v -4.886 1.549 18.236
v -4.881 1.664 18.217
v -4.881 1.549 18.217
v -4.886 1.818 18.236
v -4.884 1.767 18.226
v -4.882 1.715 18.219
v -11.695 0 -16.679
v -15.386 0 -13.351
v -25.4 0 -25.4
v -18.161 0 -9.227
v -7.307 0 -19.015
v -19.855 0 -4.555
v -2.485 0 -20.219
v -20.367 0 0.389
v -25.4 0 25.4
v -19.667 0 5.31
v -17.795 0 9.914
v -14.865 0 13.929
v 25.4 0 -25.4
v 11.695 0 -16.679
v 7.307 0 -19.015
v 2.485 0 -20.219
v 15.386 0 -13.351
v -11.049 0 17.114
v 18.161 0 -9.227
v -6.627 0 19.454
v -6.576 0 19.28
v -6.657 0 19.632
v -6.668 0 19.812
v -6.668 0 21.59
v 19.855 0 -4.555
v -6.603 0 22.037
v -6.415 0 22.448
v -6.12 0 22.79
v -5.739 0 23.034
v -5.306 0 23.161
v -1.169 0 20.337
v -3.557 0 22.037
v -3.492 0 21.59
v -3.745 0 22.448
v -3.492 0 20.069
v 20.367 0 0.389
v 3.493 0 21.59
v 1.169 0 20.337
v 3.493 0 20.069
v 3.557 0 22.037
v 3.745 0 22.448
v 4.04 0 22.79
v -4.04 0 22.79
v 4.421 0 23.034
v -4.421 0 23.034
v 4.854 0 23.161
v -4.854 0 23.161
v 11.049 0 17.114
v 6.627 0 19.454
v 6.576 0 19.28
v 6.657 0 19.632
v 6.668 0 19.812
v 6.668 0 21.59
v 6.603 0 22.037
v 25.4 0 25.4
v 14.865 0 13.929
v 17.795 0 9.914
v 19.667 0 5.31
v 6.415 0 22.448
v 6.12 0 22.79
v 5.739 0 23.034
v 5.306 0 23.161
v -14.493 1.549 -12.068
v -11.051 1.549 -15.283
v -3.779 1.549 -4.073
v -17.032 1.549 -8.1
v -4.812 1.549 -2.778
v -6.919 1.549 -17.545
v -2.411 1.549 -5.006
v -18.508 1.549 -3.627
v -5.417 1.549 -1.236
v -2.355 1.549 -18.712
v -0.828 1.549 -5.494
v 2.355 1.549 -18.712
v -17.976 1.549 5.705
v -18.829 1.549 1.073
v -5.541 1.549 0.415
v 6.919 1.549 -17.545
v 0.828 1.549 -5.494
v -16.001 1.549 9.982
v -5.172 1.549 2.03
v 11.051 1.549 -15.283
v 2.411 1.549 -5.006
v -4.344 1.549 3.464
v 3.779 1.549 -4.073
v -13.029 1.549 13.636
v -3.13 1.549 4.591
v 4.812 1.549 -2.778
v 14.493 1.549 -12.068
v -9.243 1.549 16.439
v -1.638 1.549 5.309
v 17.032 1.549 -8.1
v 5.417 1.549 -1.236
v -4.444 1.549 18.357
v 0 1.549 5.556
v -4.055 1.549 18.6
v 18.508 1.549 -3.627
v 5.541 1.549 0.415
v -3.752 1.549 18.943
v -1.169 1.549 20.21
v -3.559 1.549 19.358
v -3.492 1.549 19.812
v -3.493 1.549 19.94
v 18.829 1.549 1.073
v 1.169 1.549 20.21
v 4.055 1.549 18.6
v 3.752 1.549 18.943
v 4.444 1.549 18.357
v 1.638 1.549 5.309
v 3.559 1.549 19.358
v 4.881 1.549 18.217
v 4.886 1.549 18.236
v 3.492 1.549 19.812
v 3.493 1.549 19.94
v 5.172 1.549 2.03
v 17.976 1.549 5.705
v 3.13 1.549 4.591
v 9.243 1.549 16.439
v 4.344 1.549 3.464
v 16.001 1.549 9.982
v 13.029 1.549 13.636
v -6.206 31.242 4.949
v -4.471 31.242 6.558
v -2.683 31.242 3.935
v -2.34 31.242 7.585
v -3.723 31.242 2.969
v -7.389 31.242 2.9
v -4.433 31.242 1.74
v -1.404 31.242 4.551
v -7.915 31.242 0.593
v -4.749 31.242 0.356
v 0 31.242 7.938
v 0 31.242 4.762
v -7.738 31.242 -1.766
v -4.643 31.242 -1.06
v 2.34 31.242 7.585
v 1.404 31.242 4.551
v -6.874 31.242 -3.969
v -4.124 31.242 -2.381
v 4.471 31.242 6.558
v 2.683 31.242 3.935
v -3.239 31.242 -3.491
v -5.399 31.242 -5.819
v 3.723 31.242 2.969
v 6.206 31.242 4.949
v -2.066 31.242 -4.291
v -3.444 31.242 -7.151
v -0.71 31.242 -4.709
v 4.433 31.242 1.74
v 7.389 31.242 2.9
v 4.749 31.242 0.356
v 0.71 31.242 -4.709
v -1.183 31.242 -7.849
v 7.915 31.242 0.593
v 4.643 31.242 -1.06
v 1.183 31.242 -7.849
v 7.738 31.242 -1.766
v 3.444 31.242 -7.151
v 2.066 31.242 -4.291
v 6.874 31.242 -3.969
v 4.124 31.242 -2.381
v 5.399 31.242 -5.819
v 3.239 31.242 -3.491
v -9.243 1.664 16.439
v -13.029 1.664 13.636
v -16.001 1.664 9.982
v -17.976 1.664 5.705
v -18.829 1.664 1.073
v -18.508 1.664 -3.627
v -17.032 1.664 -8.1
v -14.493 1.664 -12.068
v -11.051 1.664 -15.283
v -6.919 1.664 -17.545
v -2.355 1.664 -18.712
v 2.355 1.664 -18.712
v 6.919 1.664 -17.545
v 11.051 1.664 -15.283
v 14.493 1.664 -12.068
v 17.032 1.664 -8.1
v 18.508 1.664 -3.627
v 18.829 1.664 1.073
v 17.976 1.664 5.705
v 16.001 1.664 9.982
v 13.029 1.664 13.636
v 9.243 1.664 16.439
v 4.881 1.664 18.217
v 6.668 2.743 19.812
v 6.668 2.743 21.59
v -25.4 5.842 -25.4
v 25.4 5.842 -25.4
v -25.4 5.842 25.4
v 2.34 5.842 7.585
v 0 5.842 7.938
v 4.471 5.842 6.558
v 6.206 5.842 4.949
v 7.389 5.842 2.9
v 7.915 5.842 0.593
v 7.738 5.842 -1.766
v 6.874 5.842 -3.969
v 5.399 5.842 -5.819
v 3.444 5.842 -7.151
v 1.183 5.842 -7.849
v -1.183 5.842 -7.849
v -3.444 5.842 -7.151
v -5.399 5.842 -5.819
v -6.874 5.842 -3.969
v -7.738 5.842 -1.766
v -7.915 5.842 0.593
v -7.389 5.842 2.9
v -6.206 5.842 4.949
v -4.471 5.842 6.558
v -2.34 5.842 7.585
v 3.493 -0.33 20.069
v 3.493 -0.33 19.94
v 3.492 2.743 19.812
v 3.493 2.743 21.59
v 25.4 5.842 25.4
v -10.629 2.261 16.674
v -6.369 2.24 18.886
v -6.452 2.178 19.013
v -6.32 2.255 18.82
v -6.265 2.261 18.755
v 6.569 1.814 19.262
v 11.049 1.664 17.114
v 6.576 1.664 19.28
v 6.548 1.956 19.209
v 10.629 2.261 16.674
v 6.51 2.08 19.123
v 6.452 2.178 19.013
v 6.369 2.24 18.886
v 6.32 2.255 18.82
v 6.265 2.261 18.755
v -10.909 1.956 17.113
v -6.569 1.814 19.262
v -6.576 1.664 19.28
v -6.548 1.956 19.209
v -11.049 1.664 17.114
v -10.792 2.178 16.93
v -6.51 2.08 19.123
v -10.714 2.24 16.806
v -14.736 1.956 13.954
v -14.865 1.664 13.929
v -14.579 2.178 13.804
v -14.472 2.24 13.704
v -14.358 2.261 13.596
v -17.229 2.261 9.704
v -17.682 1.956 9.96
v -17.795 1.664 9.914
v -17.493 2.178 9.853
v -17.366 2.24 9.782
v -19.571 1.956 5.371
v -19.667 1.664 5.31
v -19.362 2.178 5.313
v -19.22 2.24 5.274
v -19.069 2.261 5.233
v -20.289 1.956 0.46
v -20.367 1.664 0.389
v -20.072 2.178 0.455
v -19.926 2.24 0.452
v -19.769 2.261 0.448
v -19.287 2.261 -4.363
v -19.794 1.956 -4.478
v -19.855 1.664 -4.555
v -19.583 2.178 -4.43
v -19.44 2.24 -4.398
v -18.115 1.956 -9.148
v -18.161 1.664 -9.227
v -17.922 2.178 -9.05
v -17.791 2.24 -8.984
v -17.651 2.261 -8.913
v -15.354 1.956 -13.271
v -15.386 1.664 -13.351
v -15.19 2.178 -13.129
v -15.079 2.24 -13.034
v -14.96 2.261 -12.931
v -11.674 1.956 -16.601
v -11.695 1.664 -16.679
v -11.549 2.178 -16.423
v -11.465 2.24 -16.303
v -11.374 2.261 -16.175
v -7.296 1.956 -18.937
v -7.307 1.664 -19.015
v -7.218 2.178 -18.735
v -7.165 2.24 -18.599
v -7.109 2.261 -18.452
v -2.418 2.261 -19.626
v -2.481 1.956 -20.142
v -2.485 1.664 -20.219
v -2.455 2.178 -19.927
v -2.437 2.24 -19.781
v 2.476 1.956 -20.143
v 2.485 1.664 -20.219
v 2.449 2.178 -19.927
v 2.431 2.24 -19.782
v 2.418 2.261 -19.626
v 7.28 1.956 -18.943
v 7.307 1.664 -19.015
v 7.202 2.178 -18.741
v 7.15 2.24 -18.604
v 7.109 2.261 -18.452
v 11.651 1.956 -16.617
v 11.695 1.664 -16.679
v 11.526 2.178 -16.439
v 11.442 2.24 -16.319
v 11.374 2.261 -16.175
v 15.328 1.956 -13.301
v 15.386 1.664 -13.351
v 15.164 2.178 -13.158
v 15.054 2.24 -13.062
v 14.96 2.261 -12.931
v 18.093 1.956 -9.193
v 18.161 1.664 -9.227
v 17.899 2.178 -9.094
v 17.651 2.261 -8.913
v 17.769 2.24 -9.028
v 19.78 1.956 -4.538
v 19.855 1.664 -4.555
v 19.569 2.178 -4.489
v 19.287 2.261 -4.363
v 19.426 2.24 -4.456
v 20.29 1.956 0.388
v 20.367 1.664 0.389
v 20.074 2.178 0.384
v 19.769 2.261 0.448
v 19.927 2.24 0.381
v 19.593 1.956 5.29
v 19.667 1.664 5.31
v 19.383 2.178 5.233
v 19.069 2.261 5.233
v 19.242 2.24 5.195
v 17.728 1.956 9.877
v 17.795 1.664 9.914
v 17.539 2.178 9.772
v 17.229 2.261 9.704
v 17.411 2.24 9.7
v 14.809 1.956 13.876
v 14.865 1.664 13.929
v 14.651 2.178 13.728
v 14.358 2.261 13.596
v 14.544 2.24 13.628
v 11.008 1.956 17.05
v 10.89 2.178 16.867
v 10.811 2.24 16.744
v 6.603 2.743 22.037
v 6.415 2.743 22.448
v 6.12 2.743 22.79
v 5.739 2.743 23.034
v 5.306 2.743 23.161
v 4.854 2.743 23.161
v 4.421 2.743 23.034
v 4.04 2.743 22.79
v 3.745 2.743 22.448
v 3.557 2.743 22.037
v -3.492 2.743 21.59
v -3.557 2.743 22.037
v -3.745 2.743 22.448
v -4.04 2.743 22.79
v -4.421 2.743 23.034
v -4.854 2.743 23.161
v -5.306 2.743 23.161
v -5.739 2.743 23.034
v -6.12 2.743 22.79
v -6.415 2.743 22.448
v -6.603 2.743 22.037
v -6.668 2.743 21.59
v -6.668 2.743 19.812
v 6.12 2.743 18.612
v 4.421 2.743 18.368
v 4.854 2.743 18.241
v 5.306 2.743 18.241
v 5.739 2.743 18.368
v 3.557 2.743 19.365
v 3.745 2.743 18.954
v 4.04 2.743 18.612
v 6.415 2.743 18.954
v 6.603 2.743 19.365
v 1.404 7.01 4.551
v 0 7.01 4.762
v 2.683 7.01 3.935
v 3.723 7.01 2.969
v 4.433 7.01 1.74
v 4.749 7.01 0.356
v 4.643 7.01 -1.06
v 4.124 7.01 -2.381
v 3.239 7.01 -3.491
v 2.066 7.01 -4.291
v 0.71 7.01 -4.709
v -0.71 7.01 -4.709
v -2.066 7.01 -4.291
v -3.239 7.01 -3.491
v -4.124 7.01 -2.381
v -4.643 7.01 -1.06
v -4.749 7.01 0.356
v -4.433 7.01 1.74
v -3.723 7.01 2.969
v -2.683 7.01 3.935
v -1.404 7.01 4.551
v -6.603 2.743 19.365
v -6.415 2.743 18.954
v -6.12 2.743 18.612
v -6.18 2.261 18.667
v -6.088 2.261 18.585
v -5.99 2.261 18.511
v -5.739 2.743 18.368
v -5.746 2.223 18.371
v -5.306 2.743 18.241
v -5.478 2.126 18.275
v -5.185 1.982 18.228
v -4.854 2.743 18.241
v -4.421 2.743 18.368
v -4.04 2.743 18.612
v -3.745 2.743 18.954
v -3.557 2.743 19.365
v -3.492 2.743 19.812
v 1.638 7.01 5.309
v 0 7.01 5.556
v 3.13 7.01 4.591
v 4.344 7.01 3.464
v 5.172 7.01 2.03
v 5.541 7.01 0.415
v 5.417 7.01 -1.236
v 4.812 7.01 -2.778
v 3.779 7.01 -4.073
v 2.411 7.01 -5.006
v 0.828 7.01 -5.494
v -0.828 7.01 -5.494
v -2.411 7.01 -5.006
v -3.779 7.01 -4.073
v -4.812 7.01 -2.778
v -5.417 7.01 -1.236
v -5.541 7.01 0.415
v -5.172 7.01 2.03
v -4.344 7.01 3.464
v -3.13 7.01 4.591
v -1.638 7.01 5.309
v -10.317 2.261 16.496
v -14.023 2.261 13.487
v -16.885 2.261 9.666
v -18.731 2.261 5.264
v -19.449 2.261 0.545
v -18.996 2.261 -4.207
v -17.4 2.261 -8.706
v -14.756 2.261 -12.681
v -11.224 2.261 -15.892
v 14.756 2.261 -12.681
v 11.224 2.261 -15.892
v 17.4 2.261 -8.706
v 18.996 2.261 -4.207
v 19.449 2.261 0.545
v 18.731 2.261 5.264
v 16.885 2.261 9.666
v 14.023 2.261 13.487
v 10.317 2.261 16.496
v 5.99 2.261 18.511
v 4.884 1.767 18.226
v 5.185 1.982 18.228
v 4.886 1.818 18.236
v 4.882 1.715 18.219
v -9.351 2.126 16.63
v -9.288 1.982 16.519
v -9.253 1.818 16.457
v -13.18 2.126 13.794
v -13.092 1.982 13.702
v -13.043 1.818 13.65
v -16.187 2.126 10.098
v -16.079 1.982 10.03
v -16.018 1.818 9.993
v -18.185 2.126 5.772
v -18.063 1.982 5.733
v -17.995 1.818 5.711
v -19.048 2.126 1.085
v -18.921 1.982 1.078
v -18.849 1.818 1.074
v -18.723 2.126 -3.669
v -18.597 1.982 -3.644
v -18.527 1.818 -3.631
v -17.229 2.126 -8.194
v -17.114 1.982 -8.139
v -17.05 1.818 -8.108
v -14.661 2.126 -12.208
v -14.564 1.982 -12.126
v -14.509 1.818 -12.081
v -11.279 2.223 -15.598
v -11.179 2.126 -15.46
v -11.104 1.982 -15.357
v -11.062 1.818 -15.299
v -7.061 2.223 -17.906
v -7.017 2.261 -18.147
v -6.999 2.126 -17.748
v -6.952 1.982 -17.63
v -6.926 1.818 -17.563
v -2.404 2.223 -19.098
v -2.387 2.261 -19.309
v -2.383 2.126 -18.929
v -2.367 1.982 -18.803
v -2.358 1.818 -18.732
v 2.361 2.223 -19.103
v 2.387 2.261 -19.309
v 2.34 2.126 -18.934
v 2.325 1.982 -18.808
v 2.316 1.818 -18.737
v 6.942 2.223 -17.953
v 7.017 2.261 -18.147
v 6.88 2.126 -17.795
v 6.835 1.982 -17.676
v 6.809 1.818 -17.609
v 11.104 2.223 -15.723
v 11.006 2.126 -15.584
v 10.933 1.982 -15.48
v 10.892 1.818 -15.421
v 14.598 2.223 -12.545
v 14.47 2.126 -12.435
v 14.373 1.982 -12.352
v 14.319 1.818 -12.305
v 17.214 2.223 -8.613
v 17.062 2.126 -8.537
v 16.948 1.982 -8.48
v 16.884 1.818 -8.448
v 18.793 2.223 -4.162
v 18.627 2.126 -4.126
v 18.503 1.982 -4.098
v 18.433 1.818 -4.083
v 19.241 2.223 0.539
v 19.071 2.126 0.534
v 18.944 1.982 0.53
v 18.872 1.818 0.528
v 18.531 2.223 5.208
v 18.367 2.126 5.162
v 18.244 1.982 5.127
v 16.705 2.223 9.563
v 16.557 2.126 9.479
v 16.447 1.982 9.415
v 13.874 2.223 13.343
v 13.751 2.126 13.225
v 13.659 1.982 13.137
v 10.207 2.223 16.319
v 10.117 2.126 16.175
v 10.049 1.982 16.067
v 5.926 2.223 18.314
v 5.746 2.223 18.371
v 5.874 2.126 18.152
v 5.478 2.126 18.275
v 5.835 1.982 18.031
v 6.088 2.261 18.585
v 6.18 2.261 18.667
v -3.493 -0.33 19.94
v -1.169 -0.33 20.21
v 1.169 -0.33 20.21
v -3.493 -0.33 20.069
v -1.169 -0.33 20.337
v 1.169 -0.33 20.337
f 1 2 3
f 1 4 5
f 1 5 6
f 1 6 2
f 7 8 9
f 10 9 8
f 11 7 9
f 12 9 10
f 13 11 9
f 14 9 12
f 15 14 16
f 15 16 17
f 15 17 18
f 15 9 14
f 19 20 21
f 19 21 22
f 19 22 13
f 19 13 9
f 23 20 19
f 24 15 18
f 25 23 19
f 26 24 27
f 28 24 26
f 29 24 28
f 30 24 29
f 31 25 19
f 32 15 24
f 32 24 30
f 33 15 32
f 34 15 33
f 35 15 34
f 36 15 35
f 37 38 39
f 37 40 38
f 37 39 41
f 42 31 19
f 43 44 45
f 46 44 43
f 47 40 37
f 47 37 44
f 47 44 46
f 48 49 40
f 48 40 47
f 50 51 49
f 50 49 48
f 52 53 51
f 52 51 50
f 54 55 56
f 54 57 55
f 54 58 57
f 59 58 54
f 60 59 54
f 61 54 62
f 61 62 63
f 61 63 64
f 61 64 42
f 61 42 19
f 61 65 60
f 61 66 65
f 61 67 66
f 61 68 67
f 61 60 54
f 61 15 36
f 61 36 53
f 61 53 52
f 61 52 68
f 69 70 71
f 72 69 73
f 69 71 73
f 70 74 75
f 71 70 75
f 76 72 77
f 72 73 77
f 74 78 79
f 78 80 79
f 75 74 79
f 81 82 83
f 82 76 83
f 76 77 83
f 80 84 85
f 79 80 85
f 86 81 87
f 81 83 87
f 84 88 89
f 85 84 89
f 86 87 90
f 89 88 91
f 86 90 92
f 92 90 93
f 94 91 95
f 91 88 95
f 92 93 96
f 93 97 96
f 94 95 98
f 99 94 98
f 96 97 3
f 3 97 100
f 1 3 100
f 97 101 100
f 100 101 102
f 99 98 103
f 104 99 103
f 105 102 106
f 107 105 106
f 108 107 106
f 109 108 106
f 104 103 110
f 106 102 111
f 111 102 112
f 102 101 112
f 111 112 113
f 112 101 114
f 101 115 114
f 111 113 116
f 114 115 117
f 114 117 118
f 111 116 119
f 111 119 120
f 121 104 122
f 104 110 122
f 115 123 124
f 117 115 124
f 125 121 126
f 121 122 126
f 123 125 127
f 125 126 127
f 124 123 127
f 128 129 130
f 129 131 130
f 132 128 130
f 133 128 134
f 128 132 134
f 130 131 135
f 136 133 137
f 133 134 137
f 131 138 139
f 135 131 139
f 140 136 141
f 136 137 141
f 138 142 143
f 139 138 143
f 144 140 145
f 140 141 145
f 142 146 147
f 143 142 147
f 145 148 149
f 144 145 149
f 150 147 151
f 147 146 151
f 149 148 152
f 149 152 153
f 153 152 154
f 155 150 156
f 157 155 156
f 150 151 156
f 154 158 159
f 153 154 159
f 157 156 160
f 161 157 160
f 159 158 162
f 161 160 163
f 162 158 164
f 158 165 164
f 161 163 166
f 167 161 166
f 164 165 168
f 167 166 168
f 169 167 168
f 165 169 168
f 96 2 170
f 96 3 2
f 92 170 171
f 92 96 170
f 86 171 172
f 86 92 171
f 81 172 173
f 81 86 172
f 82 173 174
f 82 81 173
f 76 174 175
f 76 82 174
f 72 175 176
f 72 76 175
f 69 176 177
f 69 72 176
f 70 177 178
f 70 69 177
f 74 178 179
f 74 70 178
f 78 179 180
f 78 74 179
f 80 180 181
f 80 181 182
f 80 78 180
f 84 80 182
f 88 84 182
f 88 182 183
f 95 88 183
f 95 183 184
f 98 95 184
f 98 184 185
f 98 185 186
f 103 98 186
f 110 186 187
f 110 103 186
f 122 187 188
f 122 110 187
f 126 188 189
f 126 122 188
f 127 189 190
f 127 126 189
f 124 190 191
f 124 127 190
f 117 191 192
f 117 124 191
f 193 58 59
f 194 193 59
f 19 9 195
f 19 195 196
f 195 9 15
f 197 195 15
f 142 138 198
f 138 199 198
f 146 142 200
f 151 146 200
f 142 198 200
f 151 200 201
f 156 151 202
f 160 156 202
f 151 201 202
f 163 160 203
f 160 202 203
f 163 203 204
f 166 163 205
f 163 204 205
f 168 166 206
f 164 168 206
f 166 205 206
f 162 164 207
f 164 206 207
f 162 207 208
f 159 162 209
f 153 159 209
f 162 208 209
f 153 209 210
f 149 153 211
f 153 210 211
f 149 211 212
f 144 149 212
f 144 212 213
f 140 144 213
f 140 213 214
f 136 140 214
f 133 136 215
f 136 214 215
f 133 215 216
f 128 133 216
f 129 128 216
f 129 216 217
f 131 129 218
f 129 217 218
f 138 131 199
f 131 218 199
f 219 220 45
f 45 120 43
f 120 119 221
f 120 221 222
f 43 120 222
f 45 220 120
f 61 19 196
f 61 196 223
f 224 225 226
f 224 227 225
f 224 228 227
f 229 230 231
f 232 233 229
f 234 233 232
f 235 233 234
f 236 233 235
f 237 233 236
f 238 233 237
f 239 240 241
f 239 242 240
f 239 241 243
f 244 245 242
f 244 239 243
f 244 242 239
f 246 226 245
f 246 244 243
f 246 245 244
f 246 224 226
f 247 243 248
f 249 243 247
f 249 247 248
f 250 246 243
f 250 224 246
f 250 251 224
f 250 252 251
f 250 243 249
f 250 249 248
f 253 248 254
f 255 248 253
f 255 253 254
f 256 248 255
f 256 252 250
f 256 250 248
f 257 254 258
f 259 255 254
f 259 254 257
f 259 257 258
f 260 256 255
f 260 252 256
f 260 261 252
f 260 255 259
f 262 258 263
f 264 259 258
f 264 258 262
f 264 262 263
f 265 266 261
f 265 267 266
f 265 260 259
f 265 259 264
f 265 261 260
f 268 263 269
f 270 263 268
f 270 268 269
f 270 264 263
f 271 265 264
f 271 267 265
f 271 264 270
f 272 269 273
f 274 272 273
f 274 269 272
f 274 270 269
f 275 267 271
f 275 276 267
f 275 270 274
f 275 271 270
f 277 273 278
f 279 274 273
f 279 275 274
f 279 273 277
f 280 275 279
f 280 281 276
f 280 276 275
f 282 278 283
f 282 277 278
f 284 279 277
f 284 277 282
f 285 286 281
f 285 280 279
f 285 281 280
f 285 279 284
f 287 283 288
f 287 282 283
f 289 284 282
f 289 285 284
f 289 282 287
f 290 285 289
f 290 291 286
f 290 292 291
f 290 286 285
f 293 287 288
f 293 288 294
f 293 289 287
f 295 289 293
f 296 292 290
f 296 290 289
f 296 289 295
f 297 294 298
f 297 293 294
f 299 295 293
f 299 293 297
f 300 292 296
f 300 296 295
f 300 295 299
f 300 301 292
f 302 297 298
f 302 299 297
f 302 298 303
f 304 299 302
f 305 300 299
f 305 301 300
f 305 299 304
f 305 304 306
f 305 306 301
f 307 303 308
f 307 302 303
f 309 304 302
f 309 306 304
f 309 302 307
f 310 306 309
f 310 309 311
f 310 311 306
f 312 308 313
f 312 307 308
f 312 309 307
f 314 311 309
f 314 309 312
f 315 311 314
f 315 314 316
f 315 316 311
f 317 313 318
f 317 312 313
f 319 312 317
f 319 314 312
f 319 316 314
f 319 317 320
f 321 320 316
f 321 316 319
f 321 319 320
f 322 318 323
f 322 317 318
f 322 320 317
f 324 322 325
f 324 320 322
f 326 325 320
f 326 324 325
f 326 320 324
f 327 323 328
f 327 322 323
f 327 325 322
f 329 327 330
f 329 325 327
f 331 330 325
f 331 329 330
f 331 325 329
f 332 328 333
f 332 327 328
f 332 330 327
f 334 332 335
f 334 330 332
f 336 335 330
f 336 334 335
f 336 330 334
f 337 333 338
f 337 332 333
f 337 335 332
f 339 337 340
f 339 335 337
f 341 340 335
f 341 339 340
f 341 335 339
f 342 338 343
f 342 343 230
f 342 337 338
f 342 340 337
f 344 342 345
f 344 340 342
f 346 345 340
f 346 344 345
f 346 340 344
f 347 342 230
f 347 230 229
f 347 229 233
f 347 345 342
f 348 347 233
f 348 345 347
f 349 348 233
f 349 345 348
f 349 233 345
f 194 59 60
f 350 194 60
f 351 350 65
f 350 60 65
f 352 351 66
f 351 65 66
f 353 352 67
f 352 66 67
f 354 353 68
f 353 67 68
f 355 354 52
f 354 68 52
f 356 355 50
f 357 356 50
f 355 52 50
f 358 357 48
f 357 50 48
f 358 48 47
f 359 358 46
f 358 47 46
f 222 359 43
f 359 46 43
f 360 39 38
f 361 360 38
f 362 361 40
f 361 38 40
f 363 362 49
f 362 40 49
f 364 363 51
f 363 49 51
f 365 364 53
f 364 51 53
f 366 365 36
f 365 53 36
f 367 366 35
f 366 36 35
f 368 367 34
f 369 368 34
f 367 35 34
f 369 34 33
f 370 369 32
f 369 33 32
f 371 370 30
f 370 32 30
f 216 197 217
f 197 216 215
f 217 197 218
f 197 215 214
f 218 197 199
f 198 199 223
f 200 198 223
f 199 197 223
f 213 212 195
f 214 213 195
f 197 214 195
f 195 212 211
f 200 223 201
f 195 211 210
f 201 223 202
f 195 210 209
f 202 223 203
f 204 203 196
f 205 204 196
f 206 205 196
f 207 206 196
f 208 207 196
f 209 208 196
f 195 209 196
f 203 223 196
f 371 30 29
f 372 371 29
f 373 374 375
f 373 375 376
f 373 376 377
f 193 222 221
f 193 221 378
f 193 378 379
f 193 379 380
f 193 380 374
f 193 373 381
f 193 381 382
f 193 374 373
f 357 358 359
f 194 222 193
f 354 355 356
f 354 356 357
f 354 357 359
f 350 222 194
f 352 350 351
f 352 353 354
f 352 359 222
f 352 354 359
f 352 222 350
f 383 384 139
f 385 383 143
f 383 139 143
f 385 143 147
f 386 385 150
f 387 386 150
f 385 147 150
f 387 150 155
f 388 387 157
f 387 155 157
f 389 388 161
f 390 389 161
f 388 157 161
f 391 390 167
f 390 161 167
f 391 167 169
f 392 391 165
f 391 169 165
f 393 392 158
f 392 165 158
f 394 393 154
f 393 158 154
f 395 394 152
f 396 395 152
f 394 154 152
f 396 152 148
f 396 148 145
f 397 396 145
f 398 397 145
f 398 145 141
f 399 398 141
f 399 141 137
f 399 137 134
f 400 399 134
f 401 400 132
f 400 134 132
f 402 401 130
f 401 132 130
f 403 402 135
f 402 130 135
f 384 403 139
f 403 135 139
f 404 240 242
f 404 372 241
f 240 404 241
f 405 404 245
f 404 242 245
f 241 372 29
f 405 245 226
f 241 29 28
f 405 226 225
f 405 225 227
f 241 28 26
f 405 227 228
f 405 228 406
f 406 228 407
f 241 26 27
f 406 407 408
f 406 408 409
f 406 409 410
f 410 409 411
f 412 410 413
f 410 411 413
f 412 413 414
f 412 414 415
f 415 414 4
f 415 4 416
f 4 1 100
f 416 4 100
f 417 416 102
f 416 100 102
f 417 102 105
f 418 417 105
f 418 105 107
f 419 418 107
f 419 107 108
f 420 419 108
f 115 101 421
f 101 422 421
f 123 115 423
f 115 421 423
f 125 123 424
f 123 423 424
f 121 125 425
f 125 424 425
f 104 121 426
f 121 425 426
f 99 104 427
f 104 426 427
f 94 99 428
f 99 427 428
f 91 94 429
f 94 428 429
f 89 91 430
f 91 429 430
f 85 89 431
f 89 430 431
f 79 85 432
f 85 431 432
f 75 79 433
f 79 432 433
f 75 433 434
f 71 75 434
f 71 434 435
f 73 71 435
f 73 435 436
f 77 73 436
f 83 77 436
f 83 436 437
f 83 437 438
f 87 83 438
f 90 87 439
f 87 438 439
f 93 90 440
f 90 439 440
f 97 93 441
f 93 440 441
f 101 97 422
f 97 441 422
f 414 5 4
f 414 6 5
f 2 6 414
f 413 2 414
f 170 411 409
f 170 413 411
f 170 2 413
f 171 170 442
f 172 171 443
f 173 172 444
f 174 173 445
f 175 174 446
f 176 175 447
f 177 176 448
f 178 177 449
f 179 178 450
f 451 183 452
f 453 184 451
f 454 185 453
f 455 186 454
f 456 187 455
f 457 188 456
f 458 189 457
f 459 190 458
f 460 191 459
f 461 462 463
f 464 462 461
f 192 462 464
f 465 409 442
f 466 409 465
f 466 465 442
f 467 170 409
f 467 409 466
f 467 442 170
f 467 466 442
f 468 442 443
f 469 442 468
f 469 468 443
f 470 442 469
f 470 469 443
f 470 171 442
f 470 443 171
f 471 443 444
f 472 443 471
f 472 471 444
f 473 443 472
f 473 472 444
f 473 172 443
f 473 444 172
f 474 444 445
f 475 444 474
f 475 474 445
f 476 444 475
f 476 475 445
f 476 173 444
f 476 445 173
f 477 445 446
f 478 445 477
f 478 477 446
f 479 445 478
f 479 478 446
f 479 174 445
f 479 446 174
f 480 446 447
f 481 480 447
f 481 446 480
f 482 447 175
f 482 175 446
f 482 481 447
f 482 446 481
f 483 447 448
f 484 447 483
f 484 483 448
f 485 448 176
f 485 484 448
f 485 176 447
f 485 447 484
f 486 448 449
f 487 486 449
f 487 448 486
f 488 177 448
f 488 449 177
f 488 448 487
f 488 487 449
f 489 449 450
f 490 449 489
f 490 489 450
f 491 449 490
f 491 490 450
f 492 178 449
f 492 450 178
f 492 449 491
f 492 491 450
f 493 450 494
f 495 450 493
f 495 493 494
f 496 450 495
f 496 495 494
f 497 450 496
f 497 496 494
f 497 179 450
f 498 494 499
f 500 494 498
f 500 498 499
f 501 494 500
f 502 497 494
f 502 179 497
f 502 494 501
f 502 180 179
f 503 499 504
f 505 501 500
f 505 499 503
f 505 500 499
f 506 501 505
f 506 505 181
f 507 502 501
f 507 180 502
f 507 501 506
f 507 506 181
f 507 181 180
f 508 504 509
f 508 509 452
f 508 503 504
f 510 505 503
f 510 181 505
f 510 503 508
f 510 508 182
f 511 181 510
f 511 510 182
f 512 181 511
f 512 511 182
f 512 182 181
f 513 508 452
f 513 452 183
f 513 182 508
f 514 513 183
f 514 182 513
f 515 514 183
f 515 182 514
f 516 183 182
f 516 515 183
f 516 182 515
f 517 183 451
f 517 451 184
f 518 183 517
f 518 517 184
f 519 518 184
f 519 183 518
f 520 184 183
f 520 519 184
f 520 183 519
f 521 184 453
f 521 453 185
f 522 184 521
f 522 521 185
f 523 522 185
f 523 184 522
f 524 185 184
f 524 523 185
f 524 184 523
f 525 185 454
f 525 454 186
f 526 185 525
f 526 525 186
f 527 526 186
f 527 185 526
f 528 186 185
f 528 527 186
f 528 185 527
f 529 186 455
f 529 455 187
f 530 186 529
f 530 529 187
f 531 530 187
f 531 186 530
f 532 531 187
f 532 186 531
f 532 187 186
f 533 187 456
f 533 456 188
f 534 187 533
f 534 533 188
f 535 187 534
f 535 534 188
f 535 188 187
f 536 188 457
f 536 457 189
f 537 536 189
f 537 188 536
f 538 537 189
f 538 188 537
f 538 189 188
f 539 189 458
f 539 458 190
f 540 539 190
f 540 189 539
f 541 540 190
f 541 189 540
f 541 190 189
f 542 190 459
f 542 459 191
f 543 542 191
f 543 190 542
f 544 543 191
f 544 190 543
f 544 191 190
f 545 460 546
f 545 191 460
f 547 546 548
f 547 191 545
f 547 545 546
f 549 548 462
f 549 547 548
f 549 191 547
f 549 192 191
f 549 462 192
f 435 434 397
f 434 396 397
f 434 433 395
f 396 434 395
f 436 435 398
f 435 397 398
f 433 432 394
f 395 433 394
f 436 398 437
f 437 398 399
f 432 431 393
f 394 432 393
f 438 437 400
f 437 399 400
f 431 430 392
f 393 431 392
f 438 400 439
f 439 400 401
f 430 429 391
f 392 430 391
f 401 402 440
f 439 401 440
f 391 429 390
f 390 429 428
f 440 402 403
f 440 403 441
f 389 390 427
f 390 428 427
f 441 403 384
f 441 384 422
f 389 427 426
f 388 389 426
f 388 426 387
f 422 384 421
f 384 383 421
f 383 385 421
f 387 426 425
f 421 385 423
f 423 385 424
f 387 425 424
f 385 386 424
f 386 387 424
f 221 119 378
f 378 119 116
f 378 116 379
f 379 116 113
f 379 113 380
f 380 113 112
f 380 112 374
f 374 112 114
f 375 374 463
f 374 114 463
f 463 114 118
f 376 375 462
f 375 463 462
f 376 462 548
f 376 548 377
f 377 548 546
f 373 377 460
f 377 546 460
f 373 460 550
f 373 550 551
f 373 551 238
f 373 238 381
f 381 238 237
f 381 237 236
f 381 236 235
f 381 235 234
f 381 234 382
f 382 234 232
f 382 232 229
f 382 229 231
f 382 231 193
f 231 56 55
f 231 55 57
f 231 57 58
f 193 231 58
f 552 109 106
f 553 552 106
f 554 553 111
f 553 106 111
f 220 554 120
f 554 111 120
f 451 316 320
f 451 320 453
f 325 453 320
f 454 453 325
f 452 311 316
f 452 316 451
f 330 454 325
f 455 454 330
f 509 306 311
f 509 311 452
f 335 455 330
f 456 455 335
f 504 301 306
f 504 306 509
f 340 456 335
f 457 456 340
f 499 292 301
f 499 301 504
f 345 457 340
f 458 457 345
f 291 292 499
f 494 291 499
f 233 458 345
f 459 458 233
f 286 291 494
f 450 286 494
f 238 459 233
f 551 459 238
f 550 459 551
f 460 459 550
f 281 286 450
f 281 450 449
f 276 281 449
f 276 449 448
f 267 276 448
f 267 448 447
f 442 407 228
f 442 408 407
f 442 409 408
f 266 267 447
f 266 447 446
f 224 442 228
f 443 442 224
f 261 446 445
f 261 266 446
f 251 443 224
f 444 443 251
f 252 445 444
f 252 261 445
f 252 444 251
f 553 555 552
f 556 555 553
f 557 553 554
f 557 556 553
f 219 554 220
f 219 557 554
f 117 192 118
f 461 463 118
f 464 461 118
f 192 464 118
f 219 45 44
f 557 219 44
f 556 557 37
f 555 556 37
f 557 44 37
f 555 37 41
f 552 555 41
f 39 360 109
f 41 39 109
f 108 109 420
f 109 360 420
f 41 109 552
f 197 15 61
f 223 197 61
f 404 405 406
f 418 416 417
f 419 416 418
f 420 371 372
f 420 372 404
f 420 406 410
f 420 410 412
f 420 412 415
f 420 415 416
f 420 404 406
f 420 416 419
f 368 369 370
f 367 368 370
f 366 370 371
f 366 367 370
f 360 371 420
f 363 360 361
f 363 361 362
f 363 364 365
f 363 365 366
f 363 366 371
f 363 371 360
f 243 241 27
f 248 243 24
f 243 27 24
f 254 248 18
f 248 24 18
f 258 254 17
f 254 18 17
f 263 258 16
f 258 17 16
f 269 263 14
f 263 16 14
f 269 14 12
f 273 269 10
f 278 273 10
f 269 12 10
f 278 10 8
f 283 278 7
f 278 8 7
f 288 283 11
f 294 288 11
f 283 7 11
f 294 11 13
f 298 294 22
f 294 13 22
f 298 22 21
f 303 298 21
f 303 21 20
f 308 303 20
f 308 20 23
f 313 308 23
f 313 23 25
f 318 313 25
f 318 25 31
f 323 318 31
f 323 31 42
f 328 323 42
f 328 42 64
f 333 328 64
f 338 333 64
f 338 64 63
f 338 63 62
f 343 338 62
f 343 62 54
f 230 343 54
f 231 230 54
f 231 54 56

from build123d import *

# Parameters (mm, degrees)
F0_W      = 50.8
F0_H      = 50.8
F0_R      = 20.3708
F1_DEPTH  = 5.842
F7_ANGLE  = 330
F9_DEPTH  = 2.7432
F11_DEPTH = 1.8796


with BuildPart() as f1:
    # F0 (on Front) → F1 (new body)
    with BuildSketch(Plane.XZ):
        Rectangle(F0_W, F0_H)
        Circle(F0_R, mode=Mode.SUBTRACT)
    extrude(amount=-F1_DEPTH)

    # F2 (on Right) → F3 (revolve)
    with BuildSketch(Plane.YZ):
        Polygon((7.0104, 4.7625), (31.242, 4.7625), (31.242, 7.9375), (5.842, 7.9375), (5.842, 20.3708), (1.5494, 20.3708), (1.5494, 5.55625), (7.0104, 5.55625), align=None)
    revolve(axis=Axis((0, 6.768076, 0), (0, 1, 0)))

    # F6 (on face) → F7 (revolve, cut)
    with BuildSketch(Plane(origin=(0, 0, 0), x_dir=(0, -1, 0), z_dir=(-0.965926, 0, -0.258819))):
        with BuildLine():
            Line((-1.5494, 20.3708), (-1.6637, 20.3708))
            ThreePointArc((-1.6637, 20.3708), (-2.085772, 20.195972), (-2.2606, 19.7739))
            Line((-2.2606, 19.7739), (-2.2606, 19.4564))
            ThreePointArc((-2.2606, 19.4564), (-2.085772, 19.034328), (-1.6637, 18.8595))
            Line((-1.6637, 18.8595), (-1.5494, 18.8595))
            Line((-1.5494, 18.8595), (-1.5494, 20.3708))
        make_face()
    revolve(axis=Axis((0, -7.841465, 0), (0, -1, 0)), revolution_arc=F7_ANGLE, mode=Mode.SUBTRACT)

    # F8 (on face) → F9 (cut)
    with BuildSketch(Plane.XZ):
        with BuildLine():
            Line((-3.4925, 19.812), (-3.4925, 21.59))
            ThreePointArc((-3.4925, 21.59), (-5.08, 23.1775), (-6.6675, 21.59))
            Line((-6.6675, 21.59), (-6.6675, 19.812))
            ThreePointArc((-6.6675, 19.812), (-5.08, 18.2245), (-3.4925, 19.812))
        make_face()
        with BuildLine():
            Line((3.4925, 21.59), (3.4925, 19.812))
            ThreePointArc((3.4925, 19.812), (5.08, 18.2245), (6.6675, 19.812))
            Line((6.6675, 19.812), (6.6675, 21.59))
            ThreePointArc((6.6675, 21.59), (5.08, 23.1775), (3.4925, 21.59))
        make_face()
    extrude(amount=-F9_DEPTH, mode=Mode.SUBTRACT)

    # F10 (on face) → F11 (join)
    with BuildSketch(Plane.XZ.offset(-1.5494)):
        with BuildLine():
            Line((3.4925, 19.940258), (3.4925, 20.069179))
            ThreePointArc((3.4925, 20.069179), (0, 20.3708), (-3.4925, 20.069179))
            Line((-3.4925, 20.069179), (-3.4925, 19.940258))
            ThreePointArc((-3.4925, 19.940258), (0, 20.2438), (3.4925, 19.940258))
        make_face()
    extrude(amount=F11_DEPTH)


solid = f1.part
